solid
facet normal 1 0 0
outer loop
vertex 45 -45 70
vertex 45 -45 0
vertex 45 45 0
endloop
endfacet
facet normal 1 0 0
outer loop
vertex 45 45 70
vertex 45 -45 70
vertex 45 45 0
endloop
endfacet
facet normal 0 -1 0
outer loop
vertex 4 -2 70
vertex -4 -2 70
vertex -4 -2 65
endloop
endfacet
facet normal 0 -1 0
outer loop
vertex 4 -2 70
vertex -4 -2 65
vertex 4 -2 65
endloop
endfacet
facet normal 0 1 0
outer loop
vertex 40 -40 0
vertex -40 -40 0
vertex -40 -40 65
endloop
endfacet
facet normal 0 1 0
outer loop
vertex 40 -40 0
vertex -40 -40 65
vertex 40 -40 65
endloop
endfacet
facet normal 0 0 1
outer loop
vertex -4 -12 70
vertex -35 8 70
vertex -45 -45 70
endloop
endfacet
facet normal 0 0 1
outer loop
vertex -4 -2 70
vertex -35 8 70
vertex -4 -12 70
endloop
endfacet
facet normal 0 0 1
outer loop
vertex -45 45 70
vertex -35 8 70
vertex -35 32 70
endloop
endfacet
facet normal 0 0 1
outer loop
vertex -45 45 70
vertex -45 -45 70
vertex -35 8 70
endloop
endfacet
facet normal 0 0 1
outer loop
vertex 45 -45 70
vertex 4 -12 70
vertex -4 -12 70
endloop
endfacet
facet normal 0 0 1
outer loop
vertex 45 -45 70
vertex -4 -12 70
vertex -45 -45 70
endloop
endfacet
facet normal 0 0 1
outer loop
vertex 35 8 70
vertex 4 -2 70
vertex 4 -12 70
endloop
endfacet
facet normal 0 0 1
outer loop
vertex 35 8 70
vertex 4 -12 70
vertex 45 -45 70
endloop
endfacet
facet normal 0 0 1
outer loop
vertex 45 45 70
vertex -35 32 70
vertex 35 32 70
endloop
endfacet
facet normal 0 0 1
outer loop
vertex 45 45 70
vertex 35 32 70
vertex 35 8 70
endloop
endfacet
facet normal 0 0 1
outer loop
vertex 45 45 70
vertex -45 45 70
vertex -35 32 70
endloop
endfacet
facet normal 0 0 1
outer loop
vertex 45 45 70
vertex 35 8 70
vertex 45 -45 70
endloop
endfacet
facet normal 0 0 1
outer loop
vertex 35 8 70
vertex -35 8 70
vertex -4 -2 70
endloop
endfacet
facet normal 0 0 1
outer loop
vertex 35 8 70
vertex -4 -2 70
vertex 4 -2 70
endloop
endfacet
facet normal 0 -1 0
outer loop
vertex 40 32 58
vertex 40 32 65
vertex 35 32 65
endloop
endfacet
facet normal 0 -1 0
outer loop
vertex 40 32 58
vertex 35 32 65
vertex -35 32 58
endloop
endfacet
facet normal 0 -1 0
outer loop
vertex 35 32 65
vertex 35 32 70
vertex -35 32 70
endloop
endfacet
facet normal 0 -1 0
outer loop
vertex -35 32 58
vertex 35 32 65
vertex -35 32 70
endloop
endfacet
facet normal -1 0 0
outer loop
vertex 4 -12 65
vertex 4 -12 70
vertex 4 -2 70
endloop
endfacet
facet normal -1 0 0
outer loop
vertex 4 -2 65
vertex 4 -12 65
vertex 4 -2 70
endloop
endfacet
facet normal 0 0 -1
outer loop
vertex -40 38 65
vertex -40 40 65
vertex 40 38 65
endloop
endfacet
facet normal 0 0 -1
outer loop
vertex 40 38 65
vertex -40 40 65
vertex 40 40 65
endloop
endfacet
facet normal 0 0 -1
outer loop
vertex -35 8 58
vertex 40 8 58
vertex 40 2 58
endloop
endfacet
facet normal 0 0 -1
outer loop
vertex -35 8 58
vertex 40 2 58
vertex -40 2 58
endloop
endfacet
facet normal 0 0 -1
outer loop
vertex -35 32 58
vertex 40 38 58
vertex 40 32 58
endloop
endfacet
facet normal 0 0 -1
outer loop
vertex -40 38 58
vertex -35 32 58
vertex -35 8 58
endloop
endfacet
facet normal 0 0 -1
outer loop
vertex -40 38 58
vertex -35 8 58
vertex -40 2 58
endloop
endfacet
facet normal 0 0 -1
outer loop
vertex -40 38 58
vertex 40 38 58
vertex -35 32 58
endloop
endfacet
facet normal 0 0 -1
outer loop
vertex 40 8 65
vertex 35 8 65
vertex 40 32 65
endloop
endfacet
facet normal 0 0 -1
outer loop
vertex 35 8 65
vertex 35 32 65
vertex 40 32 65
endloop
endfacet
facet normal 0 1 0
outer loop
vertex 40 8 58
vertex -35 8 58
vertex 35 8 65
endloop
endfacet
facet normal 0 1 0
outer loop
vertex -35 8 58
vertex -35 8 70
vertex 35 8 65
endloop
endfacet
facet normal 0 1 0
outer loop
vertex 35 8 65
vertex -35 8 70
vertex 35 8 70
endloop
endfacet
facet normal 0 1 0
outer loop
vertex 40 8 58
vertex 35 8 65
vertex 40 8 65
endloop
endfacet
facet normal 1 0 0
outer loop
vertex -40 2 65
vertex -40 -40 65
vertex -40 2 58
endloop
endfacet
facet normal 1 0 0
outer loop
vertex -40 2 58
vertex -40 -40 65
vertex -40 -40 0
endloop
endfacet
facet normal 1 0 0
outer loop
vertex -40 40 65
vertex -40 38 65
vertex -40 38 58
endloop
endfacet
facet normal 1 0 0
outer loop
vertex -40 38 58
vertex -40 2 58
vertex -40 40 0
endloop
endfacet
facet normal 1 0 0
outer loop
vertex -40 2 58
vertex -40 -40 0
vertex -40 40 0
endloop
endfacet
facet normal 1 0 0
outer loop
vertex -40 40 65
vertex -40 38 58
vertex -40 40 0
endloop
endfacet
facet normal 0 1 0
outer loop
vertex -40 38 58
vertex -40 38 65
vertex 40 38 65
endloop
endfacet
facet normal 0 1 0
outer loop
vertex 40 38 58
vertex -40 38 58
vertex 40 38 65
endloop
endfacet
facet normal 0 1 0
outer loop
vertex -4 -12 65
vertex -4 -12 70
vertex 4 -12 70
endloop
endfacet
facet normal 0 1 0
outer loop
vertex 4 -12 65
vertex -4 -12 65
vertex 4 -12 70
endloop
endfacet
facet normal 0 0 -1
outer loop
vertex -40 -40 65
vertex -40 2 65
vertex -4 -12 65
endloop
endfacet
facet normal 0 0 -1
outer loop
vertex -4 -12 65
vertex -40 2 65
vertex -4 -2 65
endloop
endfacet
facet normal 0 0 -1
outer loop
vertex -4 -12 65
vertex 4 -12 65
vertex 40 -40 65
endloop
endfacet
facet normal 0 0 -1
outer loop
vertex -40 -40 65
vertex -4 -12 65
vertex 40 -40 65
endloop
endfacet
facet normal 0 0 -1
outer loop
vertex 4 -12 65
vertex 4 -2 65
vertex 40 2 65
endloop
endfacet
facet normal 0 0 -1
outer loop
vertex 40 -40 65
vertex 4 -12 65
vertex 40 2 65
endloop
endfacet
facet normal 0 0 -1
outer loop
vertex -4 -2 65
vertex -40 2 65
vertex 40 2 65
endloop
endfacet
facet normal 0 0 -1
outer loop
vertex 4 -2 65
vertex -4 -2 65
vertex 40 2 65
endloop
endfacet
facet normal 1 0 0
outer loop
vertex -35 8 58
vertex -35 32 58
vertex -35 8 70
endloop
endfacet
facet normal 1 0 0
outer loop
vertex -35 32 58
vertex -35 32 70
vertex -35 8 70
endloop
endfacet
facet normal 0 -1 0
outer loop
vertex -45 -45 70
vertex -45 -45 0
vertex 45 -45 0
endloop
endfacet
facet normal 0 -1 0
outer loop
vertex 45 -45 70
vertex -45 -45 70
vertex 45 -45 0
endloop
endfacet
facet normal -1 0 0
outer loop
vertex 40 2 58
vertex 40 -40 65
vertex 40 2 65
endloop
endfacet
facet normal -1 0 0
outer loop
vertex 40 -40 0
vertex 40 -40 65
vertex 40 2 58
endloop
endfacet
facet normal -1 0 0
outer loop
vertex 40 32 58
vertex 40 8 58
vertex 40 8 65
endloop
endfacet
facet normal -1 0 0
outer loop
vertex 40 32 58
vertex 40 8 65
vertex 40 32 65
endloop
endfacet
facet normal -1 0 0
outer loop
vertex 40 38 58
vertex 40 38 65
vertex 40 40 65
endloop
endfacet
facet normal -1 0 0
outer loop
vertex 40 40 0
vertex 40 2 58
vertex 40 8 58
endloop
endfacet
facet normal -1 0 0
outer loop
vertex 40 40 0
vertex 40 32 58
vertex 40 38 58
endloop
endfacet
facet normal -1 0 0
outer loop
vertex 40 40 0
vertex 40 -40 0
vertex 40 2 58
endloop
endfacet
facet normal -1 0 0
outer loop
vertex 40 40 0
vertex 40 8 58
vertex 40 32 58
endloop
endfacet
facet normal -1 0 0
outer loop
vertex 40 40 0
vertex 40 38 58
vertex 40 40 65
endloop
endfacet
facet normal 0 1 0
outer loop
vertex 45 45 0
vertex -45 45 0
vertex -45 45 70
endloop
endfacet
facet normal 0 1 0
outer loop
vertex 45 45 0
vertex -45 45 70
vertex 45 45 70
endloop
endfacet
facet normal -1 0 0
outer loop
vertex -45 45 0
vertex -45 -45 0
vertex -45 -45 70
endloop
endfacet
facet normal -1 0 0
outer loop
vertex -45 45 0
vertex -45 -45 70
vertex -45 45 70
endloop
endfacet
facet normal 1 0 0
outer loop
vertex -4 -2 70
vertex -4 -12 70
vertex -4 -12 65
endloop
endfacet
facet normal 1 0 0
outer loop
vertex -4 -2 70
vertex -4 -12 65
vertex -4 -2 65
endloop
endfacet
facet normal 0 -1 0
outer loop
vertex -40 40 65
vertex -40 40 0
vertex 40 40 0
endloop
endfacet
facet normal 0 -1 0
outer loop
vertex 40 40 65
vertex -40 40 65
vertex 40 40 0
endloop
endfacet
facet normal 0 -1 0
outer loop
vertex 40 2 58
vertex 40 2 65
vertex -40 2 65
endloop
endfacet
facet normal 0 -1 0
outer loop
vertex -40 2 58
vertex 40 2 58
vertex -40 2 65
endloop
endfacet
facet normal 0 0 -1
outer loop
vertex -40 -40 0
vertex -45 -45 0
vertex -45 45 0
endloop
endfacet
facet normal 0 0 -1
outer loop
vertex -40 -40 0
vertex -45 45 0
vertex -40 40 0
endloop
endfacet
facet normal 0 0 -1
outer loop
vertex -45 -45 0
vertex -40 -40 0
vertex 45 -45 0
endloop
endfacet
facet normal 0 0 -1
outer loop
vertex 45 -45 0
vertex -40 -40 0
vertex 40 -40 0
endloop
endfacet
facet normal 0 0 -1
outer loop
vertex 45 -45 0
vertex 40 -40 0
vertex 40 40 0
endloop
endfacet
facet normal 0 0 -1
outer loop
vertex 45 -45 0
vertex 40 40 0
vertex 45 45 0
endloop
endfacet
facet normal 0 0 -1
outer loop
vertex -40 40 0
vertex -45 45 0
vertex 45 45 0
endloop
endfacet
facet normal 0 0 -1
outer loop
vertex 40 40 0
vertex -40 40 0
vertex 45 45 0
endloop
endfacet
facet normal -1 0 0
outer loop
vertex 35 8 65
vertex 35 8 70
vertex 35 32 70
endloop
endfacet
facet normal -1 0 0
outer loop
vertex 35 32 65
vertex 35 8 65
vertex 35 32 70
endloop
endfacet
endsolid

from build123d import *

# Parameters (mm, degrees)
SKETCH1_W           = 90
SKETCH1_H           = 90
BOSS_EXTRUDE1_DEPTH = 70
SHELL2_T            = -5
CUT_EXTRUDE1_REACH  = 96.604
SKETCH2_W           = 70
SKETCH2_H           = 24
BOSS_EXTRUDE2_DEPTH = 7
SKETCH5_W           = 8
SKETCH5_H           = 10
CUT_EXTRUDE2_DEPTH  = 10


with BuildPart() as part:
    # Sketch1 → Boss-Extrude1 (new body)
    with BuildSketch(Plane.XY):
        Rectangle(SKETCH1_W, SKETCH1_H)
    extrude(amount=BOSS_EXTRUDE1_DEPTH)

    # Shell2
    shell2_openings = [part.faces().sort_by_distance(p)[0] for p in [
        (0, 0, 0),
    ]]
    offset(amount=SHELL2_T, openings=shell2_openings, kind=Kind.INTERSECTION)

    # Sketch2 → Cut-Extrude1 (cut, up to next)
    with BuildSketch(Plane.XY.offset(70), mode=Mode.PRIVATE) as cut_extrude1_sk1:
        with Locations((0, 20)):
            Rectangle(SKETCH2_W, SKETCH2_H)
    cut_extrude1_tool1 = extrude(cut_extrude1_sk1.sketch, amount=-CUT_EXTRUDE1_REACH, mode=Mode.PRIVATE) & part.part
    add(cut_extrude1_tool1.solids().sort_by_distance((0, 20, 70))[0], mode=Mode.SUBTRACT)

    # Sketch4 → Boss-Extrude2 (add)
    with BuildSketch(Plane(origin=(0, 0, 65), x_dir=(-1, 0, 0), z_dir=(0, 0, -1))):
        Polygon((-40, 38), (-40, 32), (-35, 32), (35, 32), (35, 8), (-35, 8), (-40, 8), (-40, 2), (40, 2), (40, 38), align=None)
    extrude(amount=BOSS_EXTRUDE2_DEPTH)

    # Sketch5 → Cut-Extrude2 (cut)
    with BuildSketch(Plane.XY.offset(70)):
        with Locations((0, -7)):
            Rectangle(SKETCH5_W, SKETCH5_H)
    extrude(amount=-CUT_EXTRUDE2_DEPTH, mode=Mode.SUBTRACT)


solid = part.part
